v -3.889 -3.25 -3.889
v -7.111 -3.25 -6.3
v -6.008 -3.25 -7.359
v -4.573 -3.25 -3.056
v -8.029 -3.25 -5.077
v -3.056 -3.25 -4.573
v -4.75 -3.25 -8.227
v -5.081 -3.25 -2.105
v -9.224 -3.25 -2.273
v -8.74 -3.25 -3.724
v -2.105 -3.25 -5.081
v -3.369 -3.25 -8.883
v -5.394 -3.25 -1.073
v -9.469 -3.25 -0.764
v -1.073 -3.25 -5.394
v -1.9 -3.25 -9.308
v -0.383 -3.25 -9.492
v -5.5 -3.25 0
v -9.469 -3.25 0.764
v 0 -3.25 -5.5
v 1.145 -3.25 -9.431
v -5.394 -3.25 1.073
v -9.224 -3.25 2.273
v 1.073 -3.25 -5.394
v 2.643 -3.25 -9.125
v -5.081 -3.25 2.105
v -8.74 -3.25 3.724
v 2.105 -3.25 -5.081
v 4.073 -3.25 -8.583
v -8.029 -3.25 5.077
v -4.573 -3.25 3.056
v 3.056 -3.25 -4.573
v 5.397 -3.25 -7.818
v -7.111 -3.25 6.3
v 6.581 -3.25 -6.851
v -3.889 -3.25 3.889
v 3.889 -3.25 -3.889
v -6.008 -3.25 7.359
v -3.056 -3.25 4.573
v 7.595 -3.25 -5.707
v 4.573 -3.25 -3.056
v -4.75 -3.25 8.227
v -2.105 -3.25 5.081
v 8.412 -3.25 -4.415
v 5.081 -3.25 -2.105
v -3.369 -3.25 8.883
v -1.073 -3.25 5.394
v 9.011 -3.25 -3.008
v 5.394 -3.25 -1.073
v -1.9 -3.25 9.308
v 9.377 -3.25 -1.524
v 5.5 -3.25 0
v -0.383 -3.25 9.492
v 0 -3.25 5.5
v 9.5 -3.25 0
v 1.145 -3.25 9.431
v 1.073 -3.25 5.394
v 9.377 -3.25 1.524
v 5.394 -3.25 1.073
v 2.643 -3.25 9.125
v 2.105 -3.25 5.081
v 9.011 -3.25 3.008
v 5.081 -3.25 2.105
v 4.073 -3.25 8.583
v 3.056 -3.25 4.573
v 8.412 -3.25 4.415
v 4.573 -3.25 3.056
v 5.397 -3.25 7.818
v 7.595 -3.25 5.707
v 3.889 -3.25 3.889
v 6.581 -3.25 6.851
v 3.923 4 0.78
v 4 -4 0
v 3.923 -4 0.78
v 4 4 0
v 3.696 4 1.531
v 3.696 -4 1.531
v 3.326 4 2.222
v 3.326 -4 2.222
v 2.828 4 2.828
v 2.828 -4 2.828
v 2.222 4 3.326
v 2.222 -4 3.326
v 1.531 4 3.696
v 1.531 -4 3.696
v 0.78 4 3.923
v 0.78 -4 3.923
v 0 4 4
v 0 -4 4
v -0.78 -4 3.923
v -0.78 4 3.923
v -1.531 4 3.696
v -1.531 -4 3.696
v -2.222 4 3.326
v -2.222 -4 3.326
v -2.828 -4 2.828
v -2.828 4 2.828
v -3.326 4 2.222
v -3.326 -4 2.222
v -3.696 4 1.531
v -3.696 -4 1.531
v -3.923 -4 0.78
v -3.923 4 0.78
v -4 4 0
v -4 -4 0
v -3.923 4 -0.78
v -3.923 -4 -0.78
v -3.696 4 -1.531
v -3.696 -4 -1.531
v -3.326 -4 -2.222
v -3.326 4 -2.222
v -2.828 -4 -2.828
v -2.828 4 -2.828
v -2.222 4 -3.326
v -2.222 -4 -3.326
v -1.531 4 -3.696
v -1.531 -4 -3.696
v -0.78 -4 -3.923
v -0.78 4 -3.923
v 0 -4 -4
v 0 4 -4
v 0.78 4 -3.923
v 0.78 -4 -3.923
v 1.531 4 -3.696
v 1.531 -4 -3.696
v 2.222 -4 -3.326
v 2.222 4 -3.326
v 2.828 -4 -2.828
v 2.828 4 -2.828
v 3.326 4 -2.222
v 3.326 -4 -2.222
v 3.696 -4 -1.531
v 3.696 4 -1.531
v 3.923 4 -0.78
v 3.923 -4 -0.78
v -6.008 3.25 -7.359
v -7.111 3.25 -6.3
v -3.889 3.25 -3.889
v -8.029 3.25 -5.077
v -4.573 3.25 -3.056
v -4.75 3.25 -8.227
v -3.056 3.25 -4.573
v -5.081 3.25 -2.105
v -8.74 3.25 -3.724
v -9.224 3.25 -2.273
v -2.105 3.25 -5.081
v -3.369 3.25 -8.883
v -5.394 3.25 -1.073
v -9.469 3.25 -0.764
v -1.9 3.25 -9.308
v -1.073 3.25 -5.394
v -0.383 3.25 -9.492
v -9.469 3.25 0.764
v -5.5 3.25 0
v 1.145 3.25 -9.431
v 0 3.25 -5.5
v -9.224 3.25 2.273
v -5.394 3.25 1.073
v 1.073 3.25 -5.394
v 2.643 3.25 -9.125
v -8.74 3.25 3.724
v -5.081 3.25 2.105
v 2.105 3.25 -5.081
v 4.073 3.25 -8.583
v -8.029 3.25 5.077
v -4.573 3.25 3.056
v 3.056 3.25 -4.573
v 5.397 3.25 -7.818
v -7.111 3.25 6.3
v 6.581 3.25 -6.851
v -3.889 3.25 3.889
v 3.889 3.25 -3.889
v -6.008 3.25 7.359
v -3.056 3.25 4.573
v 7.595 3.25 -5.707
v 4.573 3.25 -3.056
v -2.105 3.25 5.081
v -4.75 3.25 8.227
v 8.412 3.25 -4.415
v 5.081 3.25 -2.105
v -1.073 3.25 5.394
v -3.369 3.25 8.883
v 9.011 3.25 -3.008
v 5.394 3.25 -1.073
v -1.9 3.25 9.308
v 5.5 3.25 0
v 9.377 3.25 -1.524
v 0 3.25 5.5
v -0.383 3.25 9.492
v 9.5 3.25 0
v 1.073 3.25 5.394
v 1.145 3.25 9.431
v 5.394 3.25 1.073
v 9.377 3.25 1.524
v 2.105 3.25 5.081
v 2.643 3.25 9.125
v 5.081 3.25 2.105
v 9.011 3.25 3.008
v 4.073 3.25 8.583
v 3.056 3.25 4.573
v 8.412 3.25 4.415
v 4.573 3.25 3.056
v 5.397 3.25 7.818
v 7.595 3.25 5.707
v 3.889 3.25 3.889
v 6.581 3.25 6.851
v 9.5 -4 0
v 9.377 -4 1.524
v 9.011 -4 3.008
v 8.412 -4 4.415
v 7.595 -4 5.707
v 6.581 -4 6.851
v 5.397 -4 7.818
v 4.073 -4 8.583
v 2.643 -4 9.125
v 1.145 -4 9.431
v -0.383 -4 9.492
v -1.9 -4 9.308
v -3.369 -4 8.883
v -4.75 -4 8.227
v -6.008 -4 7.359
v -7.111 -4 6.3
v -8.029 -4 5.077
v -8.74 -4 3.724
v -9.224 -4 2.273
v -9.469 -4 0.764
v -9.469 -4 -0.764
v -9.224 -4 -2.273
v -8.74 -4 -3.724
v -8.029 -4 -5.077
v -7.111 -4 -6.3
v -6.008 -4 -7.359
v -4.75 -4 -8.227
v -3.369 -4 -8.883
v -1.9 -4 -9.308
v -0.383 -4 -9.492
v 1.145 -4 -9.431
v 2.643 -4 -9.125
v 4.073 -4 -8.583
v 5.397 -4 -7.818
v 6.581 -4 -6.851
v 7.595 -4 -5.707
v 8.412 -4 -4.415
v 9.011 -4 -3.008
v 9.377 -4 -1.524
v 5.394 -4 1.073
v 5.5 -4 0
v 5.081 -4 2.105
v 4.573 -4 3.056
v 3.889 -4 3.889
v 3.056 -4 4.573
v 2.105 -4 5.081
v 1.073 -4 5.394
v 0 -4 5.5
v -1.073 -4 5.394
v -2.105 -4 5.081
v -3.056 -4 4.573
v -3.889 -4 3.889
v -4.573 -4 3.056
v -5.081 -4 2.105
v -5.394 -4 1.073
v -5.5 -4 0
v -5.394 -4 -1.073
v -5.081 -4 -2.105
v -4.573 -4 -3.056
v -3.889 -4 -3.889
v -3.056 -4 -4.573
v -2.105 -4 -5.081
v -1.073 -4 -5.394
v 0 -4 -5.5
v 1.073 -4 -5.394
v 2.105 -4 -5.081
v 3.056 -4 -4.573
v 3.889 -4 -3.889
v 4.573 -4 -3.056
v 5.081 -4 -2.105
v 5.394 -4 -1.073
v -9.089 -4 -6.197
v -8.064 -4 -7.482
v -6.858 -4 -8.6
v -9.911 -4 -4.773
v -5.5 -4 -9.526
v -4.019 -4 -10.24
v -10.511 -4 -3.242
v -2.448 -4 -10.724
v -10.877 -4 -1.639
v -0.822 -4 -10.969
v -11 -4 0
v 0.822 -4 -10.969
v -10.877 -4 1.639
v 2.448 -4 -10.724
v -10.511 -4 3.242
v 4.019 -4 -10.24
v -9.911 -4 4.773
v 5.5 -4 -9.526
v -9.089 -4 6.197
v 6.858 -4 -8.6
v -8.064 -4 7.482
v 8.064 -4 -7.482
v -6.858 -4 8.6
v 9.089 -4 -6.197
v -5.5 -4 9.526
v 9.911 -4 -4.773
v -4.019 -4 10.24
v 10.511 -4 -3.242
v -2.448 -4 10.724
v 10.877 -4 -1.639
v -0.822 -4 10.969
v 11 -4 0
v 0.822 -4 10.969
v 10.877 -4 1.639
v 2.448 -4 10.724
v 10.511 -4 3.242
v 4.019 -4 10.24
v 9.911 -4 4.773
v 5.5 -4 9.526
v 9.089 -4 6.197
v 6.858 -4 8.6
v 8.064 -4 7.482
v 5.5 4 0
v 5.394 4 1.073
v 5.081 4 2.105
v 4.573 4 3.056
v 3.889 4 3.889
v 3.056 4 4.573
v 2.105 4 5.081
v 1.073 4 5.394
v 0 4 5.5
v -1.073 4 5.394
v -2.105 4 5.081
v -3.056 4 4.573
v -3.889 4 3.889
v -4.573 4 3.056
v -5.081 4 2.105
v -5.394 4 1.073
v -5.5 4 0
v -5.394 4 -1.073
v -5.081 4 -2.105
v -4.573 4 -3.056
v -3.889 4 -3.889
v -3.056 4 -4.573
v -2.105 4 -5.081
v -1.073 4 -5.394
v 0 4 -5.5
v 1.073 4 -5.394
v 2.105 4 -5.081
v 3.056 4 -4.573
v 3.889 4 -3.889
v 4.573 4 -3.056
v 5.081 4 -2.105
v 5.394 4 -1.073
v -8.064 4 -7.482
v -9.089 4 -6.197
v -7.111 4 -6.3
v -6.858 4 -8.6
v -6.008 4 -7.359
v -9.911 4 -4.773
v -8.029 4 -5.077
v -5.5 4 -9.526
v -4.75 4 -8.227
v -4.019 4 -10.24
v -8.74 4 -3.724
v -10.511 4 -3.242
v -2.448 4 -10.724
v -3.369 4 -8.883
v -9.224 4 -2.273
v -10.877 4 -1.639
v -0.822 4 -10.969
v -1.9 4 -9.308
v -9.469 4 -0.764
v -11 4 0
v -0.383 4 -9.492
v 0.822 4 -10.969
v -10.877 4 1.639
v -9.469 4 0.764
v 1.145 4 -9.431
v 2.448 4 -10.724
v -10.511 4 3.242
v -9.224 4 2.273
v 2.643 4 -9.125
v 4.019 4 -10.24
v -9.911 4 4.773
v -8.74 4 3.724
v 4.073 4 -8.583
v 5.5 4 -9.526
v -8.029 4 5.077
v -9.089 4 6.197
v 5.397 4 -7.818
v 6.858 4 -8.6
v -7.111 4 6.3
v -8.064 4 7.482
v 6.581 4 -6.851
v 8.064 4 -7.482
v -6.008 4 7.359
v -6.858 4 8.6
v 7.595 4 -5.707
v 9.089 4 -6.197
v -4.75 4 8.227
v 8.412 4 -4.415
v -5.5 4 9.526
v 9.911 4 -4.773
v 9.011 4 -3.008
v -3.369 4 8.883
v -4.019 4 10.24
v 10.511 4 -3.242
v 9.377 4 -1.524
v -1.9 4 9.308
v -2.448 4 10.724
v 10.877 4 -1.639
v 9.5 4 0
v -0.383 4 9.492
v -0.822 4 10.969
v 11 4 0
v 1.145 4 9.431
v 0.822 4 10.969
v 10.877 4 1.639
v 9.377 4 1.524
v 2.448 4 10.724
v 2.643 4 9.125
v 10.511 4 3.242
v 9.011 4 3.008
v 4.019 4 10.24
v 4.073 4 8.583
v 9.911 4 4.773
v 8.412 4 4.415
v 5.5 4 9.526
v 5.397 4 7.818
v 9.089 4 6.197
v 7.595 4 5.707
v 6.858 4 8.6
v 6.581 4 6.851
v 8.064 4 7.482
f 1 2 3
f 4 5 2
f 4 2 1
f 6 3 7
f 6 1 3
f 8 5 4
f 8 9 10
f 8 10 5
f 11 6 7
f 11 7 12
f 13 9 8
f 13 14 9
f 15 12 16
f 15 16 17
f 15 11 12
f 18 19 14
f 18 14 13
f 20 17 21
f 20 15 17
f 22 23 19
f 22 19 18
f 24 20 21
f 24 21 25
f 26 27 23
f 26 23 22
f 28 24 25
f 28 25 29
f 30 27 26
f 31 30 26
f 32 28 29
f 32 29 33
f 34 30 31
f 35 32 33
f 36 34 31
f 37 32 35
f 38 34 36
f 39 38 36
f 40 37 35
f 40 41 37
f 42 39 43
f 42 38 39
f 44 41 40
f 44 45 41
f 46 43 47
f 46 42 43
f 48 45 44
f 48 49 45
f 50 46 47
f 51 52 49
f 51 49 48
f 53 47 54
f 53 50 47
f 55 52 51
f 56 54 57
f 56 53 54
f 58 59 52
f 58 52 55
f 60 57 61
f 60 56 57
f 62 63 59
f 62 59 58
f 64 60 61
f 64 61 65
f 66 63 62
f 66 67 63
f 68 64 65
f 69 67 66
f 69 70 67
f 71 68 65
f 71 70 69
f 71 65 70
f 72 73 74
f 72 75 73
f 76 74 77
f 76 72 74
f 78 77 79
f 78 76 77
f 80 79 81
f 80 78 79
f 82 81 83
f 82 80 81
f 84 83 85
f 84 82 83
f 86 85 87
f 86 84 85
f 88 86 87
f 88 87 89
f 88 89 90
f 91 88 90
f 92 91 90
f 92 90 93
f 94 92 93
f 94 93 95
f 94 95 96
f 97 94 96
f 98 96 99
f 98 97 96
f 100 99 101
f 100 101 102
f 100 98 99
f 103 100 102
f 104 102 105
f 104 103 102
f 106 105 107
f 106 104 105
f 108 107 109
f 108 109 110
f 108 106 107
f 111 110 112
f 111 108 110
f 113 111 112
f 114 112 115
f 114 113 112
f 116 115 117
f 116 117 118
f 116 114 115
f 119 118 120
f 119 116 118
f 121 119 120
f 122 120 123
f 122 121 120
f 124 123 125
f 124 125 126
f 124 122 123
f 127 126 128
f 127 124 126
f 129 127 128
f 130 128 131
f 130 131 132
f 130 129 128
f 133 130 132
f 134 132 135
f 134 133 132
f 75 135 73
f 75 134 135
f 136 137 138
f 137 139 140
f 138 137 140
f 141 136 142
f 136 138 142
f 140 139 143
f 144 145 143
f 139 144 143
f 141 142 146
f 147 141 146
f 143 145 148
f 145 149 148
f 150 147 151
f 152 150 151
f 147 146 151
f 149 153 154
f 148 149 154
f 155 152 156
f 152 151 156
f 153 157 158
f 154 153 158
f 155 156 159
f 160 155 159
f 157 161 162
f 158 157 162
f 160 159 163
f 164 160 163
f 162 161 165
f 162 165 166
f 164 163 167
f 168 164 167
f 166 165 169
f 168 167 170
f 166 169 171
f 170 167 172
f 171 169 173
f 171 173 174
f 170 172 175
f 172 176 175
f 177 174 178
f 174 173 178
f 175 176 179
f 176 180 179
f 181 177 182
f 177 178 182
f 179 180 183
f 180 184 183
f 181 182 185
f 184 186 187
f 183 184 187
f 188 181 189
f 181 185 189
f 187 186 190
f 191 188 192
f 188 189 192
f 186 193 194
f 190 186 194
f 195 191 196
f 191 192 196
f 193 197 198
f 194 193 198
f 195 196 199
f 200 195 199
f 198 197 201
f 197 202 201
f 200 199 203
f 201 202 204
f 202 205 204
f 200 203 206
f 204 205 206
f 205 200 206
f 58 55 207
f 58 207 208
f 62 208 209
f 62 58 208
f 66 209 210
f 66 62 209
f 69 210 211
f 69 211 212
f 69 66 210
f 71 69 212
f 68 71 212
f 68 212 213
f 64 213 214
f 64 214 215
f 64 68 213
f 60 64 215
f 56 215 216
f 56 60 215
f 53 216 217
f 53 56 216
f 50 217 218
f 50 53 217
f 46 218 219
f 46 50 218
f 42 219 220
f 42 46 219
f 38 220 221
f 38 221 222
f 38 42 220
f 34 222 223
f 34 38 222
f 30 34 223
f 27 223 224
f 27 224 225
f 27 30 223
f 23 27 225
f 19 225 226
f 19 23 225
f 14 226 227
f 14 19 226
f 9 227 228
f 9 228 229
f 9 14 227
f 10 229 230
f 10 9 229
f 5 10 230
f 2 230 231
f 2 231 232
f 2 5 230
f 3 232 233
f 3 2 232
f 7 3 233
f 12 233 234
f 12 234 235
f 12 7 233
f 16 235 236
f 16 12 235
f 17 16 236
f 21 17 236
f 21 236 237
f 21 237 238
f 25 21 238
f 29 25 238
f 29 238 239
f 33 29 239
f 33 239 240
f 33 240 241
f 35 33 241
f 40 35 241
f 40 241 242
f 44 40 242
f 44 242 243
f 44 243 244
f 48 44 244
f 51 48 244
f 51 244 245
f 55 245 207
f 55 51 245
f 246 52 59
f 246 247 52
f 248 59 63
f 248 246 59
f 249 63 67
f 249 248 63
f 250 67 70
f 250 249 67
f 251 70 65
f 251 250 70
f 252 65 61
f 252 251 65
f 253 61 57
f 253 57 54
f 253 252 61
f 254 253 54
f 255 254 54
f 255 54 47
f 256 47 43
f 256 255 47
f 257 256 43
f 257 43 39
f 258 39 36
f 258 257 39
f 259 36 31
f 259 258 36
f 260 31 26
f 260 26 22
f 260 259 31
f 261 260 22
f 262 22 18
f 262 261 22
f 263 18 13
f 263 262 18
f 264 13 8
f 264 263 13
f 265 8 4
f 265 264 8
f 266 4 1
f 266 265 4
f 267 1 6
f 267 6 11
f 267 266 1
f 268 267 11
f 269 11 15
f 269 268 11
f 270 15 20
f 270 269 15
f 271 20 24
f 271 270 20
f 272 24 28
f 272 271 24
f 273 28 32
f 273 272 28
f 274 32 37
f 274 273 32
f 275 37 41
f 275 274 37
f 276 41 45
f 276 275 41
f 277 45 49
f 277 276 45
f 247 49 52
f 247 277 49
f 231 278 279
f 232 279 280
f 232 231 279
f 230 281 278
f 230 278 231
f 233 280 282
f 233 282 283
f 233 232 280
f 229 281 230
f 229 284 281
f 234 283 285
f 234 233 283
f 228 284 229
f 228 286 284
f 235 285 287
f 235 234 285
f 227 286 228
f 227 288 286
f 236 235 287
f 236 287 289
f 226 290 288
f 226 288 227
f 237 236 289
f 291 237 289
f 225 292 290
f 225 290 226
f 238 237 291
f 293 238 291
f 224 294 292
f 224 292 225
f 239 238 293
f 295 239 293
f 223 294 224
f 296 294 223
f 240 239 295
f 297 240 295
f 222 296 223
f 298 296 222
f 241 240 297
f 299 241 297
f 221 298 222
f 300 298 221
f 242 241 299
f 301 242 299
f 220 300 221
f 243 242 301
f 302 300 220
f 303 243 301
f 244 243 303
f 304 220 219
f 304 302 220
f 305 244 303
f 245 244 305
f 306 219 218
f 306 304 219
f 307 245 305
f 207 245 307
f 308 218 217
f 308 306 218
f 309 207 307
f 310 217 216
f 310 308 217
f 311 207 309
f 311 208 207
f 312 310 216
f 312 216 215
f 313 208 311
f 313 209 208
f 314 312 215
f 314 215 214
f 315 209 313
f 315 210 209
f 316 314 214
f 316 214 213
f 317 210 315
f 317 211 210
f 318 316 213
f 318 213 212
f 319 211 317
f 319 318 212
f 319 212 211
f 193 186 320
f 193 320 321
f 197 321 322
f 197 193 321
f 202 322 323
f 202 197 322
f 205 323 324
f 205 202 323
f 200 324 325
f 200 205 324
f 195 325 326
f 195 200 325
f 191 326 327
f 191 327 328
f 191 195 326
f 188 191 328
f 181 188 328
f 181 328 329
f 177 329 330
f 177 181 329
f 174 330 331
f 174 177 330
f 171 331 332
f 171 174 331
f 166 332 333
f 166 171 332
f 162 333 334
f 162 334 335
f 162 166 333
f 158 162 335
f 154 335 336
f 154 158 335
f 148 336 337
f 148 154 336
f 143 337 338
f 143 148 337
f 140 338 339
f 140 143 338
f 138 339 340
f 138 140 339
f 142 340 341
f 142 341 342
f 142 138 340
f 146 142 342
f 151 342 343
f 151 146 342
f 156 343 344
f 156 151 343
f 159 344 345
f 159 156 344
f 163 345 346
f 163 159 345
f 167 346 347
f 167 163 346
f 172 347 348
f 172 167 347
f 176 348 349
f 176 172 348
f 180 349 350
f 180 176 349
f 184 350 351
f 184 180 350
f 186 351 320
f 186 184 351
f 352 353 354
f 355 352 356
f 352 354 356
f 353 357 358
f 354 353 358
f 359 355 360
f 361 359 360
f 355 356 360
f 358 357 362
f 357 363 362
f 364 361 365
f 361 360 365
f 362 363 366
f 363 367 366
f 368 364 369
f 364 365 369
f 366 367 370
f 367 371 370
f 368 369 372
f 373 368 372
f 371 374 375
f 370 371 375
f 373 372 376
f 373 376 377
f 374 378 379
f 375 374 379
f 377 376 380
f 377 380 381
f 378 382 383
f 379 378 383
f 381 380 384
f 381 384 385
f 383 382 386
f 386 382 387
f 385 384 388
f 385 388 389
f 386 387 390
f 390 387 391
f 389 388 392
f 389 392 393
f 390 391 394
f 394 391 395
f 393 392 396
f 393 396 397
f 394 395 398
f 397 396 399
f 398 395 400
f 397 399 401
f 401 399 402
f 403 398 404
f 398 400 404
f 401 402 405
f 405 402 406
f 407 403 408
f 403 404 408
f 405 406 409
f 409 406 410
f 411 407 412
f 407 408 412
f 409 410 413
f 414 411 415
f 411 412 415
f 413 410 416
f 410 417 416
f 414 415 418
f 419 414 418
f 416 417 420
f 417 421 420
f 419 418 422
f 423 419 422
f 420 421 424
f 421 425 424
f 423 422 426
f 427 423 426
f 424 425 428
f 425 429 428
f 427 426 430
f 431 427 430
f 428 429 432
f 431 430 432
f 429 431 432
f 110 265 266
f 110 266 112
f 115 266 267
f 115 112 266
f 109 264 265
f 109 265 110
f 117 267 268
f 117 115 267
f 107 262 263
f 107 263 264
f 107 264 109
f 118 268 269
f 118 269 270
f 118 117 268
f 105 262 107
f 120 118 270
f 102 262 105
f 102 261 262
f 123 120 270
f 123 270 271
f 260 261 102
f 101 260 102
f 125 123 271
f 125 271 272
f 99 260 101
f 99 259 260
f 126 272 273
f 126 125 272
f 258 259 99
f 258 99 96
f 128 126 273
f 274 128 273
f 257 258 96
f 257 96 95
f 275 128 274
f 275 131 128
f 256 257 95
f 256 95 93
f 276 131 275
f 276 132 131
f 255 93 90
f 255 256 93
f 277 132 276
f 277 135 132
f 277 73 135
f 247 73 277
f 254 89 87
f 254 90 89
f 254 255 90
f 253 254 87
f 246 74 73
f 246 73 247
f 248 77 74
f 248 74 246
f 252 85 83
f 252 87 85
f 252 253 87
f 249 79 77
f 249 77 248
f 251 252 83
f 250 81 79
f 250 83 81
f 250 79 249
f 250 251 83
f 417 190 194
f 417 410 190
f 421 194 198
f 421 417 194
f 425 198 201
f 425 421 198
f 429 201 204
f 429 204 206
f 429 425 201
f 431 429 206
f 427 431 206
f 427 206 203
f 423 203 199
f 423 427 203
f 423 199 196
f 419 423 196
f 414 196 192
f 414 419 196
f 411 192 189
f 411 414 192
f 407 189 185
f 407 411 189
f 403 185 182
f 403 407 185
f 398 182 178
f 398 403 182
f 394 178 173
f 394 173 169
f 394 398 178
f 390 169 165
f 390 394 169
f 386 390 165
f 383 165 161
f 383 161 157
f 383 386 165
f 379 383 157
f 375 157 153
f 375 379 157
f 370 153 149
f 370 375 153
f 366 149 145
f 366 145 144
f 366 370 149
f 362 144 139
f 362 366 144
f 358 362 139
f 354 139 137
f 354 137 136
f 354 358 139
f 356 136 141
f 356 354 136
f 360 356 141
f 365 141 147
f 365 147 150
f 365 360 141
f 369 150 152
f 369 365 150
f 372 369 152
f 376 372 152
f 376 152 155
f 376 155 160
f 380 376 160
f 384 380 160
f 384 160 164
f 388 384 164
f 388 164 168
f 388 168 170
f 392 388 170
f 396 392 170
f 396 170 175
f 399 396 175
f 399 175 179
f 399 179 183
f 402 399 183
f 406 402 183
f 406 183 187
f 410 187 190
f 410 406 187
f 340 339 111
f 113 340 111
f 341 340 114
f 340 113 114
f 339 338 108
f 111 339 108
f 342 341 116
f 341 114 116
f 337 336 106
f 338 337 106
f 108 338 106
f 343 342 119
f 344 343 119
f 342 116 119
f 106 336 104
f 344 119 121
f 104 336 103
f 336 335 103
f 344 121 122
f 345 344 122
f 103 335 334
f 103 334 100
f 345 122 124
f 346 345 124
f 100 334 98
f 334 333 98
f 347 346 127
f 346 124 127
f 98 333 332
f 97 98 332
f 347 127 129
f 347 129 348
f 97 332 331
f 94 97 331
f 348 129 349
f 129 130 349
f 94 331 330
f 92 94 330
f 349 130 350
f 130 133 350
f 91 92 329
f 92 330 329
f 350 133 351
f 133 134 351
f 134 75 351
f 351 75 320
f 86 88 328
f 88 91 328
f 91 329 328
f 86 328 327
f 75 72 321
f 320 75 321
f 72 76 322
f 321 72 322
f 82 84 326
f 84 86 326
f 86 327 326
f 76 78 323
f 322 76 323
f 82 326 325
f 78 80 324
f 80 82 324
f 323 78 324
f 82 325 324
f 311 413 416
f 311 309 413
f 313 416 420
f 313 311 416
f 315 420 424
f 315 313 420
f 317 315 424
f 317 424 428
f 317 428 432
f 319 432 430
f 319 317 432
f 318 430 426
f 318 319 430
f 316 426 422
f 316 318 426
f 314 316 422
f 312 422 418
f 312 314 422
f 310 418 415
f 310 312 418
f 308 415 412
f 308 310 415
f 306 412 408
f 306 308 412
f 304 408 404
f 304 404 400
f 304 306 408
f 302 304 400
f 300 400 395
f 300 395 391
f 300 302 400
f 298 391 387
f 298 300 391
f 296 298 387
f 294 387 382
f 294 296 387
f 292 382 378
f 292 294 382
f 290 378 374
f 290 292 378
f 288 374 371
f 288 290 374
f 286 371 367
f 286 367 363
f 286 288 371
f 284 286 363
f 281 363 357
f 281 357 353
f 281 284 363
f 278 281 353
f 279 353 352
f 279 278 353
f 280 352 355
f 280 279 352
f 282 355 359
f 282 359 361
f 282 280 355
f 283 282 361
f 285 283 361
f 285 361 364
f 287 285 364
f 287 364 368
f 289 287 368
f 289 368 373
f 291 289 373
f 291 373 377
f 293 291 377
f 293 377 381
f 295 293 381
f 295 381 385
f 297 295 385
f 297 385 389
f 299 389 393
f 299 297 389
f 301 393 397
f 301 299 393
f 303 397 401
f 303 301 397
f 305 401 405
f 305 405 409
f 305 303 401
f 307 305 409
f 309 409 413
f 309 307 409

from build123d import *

# Parameters (mm, degrees)
F0_R     = 11
F0_R_2   = 9.5
F1_DEPTH = 4
F2_R     = 5.5
F2_R_2   = 4
F3_DEPTH = 4
F4_R     = 9.5
F4_R_2   = 5.5
F5_DEPTH = 3.25


with BuildPart() as f1:
    # F0 (on Front) → F1 (new body, symmetric)
    with BuildSketch(Plane.XZ):
        Circle(F0_R)
        Circle(F0_R_2, mode=Mode.SUBTRACT)
    extrude(amount=F1_DEPTH, both=True)



with BuildPart() as f3:
    # F2 (on Front) → F3 (new body, symmetric)
    with BuildSketch(Plane.XZ):
        Circle(F2_R)
        Circle(F2_R_2, mode=Mode.SUBTRACT)
    extrude(amount=F3_DEPTH, both=True)


with BuildPart() as f1_1:
    add(f1.part)

    add(f3.part)  # F5 merges F3
    # F4 (on Front) → F5 (join, symmetric)
    with BuildSketch(Plane.XZ):
        Circle(F4_R)
        Circle(F4_R_2, mode=Mode.SUBTRACT)
    extrude(amount=F5_DEPTH, both=True)


solid = f1_1.part
